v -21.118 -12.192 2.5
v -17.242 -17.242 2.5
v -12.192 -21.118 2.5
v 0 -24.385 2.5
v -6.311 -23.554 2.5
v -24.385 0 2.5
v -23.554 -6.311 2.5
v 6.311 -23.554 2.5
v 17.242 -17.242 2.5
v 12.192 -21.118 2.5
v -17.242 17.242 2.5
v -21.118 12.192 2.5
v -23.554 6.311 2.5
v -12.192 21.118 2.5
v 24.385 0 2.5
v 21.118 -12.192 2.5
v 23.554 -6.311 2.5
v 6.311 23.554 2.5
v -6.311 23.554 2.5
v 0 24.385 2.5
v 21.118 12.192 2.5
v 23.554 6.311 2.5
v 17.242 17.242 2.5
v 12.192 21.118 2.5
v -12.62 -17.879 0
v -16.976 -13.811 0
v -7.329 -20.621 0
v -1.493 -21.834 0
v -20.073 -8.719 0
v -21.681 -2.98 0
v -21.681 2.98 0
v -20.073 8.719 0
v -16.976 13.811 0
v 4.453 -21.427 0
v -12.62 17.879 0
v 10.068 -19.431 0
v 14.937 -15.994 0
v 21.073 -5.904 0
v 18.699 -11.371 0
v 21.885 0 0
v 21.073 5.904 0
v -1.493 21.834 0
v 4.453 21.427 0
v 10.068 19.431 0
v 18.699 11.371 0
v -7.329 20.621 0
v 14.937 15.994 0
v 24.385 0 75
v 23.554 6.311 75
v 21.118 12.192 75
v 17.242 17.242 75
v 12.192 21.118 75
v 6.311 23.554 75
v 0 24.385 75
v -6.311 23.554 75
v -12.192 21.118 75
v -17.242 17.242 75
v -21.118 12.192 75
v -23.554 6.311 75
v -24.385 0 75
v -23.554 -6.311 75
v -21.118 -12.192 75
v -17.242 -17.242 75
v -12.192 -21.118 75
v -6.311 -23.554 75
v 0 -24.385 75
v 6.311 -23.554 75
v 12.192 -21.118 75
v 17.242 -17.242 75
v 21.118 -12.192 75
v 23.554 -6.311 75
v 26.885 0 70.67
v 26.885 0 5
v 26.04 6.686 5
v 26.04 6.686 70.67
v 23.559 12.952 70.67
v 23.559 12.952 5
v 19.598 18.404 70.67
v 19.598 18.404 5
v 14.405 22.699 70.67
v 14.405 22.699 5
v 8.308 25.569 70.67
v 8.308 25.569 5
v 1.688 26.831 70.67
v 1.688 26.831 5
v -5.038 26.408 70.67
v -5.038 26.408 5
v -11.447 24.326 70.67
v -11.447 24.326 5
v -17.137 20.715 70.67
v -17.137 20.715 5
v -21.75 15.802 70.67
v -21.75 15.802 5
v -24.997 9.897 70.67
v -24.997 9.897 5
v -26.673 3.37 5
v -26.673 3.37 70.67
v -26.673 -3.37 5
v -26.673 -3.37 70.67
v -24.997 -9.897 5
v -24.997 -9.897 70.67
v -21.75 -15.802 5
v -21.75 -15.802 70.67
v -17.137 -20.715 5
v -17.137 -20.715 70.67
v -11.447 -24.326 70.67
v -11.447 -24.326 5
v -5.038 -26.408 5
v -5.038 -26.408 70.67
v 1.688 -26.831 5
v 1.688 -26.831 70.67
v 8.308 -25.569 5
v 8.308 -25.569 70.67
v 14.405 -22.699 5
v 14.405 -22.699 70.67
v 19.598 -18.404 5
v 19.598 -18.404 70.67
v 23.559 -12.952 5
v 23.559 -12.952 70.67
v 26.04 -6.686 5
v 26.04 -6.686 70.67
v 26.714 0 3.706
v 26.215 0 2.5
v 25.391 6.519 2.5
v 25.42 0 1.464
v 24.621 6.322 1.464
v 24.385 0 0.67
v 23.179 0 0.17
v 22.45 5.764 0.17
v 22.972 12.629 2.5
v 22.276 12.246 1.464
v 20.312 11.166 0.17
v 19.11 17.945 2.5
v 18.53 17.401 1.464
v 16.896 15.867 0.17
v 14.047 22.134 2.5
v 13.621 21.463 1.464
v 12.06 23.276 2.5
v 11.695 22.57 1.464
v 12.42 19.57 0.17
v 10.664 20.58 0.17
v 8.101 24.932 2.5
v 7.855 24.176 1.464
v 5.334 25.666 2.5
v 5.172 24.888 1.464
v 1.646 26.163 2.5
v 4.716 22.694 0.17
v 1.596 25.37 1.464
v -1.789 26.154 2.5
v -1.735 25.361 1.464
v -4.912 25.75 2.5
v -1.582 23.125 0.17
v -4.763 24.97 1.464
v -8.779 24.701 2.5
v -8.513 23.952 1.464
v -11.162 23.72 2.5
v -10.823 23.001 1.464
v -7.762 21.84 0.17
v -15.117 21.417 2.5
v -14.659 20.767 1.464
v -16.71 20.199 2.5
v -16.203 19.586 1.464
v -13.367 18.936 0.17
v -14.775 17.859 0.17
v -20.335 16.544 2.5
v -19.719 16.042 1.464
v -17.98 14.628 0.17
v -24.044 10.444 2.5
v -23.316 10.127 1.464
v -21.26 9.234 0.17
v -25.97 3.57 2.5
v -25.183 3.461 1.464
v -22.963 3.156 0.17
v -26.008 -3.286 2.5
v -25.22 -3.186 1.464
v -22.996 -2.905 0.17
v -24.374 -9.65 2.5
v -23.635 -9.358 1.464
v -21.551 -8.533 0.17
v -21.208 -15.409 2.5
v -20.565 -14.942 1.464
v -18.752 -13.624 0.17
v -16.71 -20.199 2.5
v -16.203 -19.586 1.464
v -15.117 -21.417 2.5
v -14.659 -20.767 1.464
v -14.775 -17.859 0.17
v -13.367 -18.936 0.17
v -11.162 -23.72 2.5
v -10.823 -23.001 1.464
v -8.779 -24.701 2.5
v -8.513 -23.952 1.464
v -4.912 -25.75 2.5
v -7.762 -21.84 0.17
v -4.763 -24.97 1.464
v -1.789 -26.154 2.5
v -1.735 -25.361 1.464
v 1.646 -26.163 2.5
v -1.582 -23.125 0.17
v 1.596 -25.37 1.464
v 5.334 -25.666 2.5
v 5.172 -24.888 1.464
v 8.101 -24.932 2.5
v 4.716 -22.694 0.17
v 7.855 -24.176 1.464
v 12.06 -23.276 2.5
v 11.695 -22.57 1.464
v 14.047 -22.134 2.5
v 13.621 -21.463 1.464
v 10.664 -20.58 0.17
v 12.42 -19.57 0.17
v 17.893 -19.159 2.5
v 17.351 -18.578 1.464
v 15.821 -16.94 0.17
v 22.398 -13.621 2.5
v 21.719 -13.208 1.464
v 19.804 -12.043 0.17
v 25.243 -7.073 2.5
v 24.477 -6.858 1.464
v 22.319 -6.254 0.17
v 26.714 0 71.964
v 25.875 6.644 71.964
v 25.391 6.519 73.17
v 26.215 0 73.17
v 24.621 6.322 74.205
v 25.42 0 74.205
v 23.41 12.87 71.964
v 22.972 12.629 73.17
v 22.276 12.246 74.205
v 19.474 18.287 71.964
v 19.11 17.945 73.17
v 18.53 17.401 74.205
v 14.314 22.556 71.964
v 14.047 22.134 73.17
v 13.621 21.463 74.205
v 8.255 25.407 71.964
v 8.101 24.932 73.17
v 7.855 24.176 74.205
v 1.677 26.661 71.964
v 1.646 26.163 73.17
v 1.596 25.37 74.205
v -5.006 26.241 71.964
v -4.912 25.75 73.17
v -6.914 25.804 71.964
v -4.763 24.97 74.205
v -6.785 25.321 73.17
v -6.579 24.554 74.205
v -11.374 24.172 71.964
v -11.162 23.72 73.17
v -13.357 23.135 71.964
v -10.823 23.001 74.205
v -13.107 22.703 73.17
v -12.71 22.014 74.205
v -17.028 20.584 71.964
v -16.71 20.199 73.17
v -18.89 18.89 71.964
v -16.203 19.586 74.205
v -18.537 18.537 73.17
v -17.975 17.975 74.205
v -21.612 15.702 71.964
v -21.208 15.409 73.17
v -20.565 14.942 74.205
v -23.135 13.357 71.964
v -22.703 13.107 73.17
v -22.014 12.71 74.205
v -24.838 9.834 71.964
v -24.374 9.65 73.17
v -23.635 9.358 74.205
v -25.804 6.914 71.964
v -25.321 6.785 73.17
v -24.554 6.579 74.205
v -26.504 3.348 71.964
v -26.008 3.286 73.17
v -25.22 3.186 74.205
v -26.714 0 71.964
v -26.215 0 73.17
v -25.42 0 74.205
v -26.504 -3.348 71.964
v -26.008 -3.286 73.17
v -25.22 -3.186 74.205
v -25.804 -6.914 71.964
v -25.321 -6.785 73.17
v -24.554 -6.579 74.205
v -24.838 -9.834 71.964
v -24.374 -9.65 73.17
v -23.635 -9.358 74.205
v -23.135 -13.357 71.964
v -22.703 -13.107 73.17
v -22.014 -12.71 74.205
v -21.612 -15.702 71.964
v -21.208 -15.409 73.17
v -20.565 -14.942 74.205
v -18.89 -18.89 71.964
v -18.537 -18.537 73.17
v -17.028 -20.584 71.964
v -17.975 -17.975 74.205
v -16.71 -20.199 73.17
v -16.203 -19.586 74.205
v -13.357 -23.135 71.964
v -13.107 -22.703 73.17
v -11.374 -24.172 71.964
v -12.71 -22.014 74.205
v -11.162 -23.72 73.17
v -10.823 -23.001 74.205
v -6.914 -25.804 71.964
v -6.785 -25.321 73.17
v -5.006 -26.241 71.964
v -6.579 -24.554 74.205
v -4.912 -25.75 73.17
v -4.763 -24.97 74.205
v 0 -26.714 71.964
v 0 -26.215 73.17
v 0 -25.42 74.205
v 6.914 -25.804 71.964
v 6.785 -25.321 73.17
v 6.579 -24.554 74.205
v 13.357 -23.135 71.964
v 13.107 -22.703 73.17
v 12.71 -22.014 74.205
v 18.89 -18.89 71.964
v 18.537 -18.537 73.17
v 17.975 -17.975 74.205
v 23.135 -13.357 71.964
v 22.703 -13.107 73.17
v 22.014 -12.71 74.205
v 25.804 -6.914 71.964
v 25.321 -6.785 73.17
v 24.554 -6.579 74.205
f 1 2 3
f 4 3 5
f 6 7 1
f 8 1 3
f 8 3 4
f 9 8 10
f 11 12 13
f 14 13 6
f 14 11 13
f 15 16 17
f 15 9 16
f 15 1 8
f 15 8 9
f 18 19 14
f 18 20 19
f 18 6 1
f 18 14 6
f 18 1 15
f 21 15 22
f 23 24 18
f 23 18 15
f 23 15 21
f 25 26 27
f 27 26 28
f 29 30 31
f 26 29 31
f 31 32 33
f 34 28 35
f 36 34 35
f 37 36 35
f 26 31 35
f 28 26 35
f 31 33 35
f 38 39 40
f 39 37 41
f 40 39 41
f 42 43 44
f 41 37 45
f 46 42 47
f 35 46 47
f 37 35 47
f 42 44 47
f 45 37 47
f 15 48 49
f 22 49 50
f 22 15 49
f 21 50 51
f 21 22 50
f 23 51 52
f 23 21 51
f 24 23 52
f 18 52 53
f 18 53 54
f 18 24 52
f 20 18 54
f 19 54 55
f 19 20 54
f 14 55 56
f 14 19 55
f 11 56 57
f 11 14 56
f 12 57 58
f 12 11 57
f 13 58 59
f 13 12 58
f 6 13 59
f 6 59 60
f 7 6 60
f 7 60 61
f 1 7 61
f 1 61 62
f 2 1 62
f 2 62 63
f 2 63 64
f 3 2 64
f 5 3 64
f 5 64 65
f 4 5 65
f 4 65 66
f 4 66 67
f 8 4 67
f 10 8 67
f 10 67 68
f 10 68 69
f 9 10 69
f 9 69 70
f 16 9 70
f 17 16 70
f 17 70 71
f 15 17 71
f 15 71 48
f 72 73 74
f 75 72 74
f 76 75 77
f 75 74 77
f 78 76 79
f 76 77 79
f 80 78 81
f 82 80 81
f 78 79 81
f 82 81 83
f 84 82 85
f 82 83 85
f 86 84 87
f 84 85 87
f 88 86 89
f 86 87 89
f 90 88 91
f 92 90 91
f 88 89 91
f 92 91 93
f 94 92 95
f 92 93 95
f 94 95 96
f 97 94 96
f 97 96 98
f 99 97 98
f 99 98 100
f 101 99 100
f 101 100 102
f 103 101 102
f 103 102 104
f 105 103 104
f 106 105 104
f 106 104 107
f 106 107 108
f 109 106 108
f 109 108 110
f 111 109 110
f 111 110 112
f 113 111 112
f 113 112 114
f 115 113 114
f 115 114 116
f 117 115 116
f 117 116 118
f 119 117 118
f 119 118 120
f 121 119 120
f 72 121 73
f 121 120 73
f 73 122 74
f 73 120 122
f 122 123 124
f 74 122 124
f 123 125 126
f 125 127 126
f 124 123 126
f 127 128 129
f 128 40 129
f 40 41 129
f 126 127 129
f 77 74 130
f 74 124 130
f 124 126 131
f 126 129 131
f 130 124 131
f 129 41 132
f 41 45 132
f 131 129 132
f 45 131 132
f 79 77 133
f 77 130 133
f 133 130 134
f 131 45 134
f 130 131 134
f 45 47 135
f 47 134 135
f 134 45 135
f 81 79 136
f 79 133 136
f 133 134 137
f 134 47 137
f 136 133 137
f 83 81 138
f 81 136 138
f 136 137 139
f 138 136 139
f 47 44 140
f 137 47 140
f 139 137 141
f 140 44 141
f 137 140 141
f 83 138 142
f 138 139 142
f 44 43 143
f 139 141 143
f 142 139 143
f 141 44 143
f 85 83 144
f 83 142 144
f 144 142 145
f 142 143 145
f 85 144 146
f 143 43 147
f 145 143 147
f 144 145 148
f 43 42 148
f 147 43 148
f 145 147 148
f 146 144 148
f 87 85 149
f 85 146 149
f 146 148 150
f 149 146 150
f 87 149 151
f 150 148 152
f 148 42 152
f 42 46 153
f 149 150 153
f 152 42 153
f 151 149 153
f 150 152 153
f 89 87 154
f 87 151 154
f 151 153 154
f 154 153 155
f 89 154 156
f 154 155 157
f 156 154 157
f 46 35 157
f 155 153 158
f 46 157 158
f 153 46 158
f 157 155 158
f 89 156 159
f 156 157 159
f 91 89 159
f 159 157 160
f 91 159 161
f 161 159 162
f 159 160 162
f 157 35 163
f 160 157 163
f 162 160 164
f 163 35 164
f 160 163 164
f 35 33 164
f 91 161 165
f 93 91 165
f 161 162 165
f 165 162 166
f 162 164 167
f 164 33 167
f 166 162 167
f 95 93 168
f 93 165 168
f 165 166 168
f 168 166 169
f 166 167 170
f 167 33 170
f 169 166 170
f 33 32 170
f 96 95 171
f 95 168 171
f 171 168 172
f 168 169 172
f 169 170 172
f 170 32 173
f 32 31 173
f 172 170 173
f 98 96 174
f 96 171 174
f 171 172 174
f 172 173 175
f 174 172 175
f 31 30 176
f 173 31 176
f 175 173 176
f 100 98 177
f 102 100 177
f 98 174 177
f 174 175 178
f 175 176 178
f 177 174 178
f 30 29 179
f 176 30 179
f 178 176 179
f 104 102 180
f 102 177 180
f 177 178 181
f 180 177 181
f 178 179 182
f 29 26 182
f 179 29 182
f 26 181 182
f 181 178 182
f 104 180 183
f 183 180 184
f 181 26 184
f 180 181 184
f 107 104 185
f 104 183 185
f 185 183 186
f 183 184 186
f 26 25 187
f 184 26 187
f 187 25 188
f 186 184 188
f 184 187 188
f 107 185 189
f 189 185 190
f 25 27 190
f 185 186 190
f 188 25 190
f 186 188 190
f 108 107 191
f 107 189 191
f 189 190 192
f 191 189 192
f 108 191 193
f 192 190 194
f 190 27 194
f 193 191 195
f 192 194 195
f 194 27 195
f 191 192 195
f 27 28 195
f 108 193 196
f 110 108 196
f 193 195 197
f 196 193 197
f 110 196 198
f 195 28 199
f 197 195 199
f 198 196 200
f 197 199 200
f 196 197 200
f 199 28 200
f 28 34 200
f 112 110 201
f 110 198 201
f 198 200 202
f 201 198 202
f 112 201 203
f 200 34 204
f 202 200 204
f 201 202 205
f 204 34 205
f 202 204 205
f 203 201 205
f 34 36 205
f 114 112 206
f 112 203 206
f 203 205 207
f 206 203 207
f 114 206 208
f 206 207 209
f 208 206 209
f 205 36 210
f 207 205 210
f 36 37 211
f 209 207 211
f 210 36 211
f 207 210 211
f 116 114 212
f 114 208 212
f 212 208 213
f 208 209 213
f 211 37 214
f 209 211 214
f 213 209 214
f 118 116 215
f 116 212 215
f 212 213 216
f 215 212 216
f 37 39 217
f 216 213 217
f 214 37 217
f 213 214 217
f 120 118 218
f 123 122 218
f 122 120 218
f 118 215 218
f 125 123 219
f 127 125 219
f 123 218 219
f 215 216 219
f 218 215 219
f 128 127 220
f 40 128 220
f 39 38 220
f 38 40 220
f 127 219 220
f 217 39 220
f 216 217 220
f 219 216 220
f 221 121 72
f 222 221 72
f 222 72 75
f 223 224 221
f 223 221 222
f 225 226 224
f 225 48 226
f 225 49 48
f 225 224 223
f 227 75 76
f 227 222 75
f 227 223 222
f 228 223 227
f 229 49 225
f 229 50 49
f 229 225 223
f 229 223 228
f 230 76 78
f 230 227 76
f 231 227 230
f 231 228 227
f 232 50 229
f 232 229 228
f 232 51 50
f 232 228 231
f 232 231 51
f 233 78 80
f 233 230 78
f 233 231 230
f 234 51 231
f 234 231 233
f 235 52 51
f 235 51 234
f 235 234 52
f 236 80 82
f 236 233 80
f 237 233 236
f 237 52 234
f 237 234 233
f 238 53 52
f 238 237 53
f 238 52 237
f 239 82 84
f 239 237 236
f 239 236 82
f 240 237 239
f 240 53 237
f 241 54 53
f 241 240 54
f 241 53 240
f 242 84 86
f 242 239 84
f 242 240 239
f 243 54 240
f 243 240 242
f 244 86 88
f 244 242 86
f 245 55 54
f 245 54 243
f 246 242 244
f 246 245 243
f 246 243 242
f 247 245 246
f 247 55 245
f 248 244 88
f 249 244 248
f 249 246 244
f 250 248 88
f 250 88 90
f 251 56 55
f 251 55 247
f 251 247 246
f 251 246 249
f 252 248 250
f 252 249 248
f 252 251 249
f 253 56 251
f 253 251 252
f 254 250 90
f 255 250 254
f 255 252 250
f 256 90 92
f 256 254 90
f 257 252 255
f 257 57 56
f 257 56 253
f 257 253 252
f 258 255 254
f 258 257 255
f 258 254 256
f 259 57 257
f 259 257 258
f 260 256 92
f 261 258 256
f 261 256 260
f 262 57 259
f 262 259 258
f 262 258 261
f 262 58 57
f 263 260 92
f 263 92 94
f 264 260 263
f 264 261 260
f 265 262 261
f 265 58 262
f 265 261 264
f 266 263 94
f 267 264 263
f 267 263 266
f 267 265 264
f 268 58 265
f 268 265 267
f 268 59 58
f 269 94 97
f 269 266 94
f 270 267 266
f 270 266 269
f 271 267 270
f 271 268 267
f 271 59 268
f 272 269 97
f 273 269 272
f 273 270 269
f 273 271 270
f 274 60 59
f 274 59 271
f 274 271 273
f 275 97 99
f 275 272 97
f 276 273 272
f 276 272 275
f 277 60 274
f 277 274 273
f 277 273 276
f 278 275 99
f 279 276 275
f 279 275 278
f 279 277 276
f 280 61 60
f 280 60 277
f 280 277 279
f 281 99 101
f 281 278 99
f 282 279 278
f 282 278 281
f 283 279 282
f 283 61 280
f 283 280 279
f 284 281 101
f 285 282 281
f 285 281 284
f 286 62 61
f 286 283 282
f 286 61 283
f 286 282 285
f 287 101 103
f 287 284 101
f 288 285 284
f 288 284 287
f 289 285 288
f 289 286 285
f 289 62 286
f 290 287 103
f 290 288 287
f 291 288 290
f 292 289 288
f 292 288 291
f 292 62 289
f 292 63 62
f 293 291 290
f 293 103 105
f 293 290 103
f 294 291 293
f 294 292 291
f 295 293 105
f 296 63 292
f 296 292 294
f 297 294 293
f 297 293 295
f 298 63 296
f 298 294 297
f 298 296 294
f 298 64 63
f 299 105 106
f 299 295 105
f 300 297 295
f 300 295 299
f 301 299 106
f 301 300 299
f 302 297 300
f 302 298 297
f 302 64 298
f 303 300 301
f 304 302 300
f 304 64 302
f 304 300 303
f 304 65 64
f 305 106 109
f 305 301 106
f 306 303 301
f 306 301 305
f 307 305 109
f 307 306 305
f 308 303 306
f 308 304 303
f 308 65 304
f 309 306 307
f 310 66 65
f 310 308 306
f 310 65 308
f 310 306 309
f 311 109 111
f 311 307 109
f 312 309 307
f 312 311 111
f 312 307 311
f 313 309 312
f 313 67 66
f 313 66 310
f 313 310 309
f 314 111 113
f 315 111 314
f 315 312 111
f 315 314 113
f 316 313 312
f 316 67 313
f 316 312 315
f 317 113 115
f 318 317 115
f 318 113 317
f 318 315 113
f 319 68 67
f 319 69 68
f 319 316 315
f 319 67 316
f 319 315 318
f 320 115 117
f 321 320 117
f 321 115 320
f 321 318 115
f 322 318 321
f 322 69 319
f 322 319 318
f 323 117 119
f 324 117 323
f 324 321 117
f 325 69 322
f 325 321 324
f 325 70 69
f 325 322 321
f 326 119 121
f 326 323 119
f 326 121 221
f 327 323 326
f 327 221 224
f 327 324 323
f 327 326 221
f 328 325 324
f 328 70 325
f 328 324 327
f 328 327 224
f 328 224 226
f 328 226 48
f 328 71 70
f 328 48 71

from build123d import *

# Parameters (mm, degrees)
F0_R     = 26.884522514
F1_DEPTH = 75
F2_T     = -2.5
F4_R     = 5


# Not quite as in the source:
# - a fillet or chamfer that OpenCascade refuses, or shapes differently, is made with other operations: its cross-section is extruded or revolved along the edge and cut away or added


with BuildPart() as f1:
    # F0 (on Top) → F1 (new body)
    with BuildSketch(Plane.XY):
        Circle(F0_R)
    extrude(amount=F1_DEPTH)

    # F2
    f2_openings = [f1.faces().sort_by_distance(p)[0] for p in [
        (0, 0, 75),
    ]]
    offset(amount=F2_T, openings=f2_openings)

    # F3: fillet of radius 5 on 1 edges, made by hand

    # F3_s1 → F3_t2 (revolve, cut)
    with BuildSketch(Plane.XZ):
        with BuildLine():
            ThreePointArc((26.884522514, 70.6698729811), (26.2146495329, 73.1698729811), (24.384522514, 75))
            Line((24.384522514, 75), (26.884522514, 75))
            Line((26.884522514, 75), (26.884522514, 70.6698729811))
        make_face()
    revolve(axis=Axis((0, 0, 75), (0, 0, 1)), mode=Mode.SUBTRACT)

    # F4
    f4_edges = [f1.edges().sort_by_distance(p)[0] for p in [
        (-26.884523, 0, 0),
    ]]
    fillet(f4_edges, radius=F4_R)


solid = f1.part
